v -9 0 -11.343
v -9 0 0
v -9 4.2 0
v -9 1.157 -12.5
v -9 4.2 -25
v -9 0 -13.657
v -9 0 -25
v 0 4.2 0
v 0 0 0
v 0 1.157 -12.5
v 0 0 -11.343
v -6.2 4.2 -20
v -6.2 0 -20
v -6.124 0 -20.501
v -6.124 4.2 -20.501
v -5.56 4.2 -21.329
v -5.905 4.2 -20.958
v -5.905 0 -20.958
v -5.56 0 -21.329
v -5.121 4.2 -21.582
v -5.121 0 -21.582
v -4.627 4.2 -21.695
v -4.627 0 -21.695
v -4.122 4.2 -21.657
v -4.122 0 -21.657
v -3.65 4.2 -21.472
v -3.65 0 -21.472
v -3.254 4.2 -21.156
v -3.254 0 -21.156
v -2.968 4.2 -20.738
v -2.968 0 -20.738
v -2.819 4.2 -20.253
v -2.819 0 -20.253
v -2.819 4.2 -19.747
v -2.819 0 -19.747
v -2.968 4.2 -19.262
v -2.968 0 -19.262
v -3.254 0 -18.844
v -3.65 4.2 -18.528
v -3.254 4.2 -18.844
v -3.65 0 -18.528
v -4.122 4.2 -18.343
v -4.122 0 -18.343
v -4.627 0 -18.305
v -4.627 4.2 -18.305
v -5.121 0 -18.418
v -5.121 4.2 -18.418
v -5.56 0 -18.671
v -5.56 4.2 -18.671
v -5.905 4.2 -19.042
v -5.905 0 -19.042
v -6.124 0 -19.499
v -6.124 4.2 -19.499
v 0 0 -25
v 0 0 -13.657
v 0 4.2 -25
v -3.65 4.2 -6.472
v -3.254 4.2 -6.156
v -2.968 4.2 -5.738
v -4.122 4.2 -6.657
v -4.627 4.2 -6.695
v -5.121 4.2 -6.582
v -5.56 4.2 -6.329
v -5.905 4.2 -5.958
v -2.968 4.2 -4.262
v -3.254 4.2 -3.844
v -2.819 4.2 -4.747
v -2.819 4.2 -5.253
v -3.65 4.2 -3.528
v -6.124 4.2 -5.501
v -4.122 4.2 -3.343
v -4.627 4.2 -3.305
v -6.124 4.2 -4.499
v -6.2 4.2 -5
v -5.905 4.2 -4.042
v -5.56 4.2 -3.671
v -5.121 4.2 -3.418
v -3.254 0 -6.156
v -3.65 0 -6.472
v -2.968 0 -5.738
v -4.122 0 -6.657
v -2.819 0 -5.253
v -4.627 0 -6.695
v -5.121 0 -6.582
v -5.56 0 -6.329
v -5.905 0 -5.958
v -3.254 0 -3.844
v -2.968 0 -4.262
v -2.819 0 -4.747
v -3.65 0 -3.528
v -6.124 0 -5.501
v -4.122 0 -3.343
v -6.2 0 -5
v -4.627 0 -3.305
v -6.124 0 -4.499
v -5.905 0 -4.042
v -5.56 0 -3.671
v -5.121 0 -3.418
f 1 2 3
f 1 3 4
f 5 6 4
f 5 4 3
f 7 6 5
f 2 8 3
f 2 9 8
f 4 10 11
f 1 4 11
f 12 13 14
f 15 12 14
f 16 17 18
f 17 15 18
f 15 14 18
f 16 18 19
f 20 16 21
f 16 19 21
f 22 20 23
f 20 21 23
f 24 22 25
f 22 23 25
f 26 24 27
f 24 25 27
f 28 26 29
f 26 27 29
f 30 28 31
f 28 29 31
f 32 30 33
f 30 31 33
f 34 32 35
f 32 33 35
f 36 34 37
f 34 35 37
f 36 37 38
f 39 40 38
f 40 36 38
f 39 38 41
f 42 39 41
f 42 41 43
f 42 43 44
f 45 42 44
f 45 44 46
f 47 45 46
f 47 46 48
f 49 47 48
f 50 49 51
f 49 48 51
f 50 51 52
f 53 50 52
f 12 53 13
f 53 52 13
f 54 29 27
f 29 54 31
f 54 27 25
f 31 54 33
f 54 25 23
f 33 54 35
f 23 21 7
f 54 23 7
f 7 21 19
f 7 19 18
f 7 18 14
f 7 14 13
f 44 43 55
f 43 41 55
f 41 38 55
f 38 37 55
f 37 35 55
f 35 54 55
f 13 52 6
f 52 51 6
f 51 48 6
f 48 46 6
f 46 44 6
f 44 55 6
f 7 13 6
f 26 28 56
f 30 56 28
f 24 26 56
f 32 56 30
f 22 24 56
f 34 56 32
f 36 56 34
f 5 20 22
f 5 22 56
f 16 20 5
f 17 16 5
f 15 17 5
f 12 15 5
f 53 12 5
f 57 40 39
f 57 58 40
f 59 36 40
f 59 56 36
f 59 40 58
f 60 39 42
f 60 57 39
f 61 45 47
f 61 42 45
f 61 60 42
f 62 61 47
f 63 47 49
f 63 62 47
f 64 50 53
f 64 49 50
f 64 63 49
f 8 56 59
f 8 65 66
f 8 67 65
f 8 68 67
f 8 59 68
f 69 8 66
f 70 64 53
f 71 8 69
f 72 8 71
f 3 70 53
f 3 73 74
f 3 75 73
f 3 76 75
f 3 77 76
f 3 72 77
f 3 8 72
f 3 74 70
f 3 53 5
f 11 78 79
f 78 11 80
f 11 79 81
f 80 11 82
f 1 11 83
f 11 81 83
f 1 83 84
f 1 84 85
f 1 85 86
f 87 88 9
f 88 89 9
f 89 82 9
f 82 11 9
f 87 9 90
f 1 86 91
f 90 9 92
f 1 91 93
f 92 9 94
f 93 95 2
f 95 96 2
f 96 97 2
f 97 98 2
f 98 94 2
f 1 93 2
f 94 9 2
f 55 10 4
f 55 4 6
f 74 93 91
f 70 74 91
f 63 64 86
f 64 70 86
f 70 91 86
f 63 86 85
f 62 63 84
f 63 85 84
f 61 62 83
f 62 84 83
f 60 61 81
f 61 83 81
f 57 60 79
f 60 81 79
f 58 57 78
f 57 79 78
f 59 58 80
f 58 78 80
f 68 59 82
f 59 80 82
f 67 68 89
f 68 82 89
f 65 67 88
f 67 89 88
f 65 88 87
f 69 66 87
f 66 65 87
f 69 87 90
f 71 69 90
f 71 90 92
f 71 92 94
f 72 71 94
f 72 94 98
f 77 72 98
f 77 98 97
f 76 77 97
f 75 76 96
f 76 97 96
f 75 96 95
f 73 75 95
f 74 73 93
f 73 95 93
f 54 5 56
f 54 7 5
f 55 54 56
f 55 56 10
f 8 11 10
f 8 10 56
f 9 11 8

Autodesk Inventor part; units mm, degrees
ref_plane "YZ Plane" through (0, 0, 0) normal (1, 0, 0) x (0, 1, 0)
ref_plane "XZ Plane" through (0, 0, 0) normal (0, 1, 0) x (-1, 0, 0)
ref_plane "XY Plane" through (0, 0, 0) normal (0, 0, 1) x (1, 0, 0)
sketch "Sketch1" plane through (0, 0, 0) normal (0, 1, 0) x (-1, 0, 0)
  line L0 (0, 0) -> (9, 0)
  line L1 (9, 0) -> (9, -25)
  line L2 (9, -25) -> (0, -25)
  line L3 (0, -25) -> (0, 0)
  circle A0 centre (4.5, -5) radius 1.7
  circle A1 centre (4.5, -20) radius 1.7
  line L4 (4.5, 0) -> (4.5, -25) construction
  line L5 (9, -12.5) -> (0, -12.5) construction
  dimension "d0" = 9
  dimension "d1" = 3.4
  dimension "d2" = 3.4
  dimension "d3" = 7.5
  dimension "d4" = 7.5
  dimension "d5" = 25
extrude "Extrusion1" add sketch "Sketch1" along normal blind 4.2
sketch "Sketch2" plane through (0, 0, 0) normal (1, 0, 0) x (0, 0, -1)
  line L0 (0, 0) -> (25, 0) construction
  line L1 (12.5, 0) -> (12.5, 1.1571) construction
  line L2 (12.5, 1.1571) -> (11.3429, 0)
  line L3 (12.5, 1.1571) -> (13.6571, 0)
  line L4 (9.1461, 0) -> (13.6571, 0)
  circle A0 centre (12.5, 0.45) radius 0.5
  point P0 (11.3429, 0)
  dimension "d8" = 45
  dimension "d10" = 45
  dimension "d14" = 1
  dimension "d15" = 0.45
extrude "Extrusion2" cut sketch "Sketch2" against normal through all contours L3 A0 L2 | A0 L4 L2 | A0 L4 | L3 L4 A0 picked at (12.3997, 0.4044)
equation "\"d1\" = d2"
equation "\"d4\" = d3"
equation "\"d10\" = d8"
properties part number "suction_electrode_holder"
